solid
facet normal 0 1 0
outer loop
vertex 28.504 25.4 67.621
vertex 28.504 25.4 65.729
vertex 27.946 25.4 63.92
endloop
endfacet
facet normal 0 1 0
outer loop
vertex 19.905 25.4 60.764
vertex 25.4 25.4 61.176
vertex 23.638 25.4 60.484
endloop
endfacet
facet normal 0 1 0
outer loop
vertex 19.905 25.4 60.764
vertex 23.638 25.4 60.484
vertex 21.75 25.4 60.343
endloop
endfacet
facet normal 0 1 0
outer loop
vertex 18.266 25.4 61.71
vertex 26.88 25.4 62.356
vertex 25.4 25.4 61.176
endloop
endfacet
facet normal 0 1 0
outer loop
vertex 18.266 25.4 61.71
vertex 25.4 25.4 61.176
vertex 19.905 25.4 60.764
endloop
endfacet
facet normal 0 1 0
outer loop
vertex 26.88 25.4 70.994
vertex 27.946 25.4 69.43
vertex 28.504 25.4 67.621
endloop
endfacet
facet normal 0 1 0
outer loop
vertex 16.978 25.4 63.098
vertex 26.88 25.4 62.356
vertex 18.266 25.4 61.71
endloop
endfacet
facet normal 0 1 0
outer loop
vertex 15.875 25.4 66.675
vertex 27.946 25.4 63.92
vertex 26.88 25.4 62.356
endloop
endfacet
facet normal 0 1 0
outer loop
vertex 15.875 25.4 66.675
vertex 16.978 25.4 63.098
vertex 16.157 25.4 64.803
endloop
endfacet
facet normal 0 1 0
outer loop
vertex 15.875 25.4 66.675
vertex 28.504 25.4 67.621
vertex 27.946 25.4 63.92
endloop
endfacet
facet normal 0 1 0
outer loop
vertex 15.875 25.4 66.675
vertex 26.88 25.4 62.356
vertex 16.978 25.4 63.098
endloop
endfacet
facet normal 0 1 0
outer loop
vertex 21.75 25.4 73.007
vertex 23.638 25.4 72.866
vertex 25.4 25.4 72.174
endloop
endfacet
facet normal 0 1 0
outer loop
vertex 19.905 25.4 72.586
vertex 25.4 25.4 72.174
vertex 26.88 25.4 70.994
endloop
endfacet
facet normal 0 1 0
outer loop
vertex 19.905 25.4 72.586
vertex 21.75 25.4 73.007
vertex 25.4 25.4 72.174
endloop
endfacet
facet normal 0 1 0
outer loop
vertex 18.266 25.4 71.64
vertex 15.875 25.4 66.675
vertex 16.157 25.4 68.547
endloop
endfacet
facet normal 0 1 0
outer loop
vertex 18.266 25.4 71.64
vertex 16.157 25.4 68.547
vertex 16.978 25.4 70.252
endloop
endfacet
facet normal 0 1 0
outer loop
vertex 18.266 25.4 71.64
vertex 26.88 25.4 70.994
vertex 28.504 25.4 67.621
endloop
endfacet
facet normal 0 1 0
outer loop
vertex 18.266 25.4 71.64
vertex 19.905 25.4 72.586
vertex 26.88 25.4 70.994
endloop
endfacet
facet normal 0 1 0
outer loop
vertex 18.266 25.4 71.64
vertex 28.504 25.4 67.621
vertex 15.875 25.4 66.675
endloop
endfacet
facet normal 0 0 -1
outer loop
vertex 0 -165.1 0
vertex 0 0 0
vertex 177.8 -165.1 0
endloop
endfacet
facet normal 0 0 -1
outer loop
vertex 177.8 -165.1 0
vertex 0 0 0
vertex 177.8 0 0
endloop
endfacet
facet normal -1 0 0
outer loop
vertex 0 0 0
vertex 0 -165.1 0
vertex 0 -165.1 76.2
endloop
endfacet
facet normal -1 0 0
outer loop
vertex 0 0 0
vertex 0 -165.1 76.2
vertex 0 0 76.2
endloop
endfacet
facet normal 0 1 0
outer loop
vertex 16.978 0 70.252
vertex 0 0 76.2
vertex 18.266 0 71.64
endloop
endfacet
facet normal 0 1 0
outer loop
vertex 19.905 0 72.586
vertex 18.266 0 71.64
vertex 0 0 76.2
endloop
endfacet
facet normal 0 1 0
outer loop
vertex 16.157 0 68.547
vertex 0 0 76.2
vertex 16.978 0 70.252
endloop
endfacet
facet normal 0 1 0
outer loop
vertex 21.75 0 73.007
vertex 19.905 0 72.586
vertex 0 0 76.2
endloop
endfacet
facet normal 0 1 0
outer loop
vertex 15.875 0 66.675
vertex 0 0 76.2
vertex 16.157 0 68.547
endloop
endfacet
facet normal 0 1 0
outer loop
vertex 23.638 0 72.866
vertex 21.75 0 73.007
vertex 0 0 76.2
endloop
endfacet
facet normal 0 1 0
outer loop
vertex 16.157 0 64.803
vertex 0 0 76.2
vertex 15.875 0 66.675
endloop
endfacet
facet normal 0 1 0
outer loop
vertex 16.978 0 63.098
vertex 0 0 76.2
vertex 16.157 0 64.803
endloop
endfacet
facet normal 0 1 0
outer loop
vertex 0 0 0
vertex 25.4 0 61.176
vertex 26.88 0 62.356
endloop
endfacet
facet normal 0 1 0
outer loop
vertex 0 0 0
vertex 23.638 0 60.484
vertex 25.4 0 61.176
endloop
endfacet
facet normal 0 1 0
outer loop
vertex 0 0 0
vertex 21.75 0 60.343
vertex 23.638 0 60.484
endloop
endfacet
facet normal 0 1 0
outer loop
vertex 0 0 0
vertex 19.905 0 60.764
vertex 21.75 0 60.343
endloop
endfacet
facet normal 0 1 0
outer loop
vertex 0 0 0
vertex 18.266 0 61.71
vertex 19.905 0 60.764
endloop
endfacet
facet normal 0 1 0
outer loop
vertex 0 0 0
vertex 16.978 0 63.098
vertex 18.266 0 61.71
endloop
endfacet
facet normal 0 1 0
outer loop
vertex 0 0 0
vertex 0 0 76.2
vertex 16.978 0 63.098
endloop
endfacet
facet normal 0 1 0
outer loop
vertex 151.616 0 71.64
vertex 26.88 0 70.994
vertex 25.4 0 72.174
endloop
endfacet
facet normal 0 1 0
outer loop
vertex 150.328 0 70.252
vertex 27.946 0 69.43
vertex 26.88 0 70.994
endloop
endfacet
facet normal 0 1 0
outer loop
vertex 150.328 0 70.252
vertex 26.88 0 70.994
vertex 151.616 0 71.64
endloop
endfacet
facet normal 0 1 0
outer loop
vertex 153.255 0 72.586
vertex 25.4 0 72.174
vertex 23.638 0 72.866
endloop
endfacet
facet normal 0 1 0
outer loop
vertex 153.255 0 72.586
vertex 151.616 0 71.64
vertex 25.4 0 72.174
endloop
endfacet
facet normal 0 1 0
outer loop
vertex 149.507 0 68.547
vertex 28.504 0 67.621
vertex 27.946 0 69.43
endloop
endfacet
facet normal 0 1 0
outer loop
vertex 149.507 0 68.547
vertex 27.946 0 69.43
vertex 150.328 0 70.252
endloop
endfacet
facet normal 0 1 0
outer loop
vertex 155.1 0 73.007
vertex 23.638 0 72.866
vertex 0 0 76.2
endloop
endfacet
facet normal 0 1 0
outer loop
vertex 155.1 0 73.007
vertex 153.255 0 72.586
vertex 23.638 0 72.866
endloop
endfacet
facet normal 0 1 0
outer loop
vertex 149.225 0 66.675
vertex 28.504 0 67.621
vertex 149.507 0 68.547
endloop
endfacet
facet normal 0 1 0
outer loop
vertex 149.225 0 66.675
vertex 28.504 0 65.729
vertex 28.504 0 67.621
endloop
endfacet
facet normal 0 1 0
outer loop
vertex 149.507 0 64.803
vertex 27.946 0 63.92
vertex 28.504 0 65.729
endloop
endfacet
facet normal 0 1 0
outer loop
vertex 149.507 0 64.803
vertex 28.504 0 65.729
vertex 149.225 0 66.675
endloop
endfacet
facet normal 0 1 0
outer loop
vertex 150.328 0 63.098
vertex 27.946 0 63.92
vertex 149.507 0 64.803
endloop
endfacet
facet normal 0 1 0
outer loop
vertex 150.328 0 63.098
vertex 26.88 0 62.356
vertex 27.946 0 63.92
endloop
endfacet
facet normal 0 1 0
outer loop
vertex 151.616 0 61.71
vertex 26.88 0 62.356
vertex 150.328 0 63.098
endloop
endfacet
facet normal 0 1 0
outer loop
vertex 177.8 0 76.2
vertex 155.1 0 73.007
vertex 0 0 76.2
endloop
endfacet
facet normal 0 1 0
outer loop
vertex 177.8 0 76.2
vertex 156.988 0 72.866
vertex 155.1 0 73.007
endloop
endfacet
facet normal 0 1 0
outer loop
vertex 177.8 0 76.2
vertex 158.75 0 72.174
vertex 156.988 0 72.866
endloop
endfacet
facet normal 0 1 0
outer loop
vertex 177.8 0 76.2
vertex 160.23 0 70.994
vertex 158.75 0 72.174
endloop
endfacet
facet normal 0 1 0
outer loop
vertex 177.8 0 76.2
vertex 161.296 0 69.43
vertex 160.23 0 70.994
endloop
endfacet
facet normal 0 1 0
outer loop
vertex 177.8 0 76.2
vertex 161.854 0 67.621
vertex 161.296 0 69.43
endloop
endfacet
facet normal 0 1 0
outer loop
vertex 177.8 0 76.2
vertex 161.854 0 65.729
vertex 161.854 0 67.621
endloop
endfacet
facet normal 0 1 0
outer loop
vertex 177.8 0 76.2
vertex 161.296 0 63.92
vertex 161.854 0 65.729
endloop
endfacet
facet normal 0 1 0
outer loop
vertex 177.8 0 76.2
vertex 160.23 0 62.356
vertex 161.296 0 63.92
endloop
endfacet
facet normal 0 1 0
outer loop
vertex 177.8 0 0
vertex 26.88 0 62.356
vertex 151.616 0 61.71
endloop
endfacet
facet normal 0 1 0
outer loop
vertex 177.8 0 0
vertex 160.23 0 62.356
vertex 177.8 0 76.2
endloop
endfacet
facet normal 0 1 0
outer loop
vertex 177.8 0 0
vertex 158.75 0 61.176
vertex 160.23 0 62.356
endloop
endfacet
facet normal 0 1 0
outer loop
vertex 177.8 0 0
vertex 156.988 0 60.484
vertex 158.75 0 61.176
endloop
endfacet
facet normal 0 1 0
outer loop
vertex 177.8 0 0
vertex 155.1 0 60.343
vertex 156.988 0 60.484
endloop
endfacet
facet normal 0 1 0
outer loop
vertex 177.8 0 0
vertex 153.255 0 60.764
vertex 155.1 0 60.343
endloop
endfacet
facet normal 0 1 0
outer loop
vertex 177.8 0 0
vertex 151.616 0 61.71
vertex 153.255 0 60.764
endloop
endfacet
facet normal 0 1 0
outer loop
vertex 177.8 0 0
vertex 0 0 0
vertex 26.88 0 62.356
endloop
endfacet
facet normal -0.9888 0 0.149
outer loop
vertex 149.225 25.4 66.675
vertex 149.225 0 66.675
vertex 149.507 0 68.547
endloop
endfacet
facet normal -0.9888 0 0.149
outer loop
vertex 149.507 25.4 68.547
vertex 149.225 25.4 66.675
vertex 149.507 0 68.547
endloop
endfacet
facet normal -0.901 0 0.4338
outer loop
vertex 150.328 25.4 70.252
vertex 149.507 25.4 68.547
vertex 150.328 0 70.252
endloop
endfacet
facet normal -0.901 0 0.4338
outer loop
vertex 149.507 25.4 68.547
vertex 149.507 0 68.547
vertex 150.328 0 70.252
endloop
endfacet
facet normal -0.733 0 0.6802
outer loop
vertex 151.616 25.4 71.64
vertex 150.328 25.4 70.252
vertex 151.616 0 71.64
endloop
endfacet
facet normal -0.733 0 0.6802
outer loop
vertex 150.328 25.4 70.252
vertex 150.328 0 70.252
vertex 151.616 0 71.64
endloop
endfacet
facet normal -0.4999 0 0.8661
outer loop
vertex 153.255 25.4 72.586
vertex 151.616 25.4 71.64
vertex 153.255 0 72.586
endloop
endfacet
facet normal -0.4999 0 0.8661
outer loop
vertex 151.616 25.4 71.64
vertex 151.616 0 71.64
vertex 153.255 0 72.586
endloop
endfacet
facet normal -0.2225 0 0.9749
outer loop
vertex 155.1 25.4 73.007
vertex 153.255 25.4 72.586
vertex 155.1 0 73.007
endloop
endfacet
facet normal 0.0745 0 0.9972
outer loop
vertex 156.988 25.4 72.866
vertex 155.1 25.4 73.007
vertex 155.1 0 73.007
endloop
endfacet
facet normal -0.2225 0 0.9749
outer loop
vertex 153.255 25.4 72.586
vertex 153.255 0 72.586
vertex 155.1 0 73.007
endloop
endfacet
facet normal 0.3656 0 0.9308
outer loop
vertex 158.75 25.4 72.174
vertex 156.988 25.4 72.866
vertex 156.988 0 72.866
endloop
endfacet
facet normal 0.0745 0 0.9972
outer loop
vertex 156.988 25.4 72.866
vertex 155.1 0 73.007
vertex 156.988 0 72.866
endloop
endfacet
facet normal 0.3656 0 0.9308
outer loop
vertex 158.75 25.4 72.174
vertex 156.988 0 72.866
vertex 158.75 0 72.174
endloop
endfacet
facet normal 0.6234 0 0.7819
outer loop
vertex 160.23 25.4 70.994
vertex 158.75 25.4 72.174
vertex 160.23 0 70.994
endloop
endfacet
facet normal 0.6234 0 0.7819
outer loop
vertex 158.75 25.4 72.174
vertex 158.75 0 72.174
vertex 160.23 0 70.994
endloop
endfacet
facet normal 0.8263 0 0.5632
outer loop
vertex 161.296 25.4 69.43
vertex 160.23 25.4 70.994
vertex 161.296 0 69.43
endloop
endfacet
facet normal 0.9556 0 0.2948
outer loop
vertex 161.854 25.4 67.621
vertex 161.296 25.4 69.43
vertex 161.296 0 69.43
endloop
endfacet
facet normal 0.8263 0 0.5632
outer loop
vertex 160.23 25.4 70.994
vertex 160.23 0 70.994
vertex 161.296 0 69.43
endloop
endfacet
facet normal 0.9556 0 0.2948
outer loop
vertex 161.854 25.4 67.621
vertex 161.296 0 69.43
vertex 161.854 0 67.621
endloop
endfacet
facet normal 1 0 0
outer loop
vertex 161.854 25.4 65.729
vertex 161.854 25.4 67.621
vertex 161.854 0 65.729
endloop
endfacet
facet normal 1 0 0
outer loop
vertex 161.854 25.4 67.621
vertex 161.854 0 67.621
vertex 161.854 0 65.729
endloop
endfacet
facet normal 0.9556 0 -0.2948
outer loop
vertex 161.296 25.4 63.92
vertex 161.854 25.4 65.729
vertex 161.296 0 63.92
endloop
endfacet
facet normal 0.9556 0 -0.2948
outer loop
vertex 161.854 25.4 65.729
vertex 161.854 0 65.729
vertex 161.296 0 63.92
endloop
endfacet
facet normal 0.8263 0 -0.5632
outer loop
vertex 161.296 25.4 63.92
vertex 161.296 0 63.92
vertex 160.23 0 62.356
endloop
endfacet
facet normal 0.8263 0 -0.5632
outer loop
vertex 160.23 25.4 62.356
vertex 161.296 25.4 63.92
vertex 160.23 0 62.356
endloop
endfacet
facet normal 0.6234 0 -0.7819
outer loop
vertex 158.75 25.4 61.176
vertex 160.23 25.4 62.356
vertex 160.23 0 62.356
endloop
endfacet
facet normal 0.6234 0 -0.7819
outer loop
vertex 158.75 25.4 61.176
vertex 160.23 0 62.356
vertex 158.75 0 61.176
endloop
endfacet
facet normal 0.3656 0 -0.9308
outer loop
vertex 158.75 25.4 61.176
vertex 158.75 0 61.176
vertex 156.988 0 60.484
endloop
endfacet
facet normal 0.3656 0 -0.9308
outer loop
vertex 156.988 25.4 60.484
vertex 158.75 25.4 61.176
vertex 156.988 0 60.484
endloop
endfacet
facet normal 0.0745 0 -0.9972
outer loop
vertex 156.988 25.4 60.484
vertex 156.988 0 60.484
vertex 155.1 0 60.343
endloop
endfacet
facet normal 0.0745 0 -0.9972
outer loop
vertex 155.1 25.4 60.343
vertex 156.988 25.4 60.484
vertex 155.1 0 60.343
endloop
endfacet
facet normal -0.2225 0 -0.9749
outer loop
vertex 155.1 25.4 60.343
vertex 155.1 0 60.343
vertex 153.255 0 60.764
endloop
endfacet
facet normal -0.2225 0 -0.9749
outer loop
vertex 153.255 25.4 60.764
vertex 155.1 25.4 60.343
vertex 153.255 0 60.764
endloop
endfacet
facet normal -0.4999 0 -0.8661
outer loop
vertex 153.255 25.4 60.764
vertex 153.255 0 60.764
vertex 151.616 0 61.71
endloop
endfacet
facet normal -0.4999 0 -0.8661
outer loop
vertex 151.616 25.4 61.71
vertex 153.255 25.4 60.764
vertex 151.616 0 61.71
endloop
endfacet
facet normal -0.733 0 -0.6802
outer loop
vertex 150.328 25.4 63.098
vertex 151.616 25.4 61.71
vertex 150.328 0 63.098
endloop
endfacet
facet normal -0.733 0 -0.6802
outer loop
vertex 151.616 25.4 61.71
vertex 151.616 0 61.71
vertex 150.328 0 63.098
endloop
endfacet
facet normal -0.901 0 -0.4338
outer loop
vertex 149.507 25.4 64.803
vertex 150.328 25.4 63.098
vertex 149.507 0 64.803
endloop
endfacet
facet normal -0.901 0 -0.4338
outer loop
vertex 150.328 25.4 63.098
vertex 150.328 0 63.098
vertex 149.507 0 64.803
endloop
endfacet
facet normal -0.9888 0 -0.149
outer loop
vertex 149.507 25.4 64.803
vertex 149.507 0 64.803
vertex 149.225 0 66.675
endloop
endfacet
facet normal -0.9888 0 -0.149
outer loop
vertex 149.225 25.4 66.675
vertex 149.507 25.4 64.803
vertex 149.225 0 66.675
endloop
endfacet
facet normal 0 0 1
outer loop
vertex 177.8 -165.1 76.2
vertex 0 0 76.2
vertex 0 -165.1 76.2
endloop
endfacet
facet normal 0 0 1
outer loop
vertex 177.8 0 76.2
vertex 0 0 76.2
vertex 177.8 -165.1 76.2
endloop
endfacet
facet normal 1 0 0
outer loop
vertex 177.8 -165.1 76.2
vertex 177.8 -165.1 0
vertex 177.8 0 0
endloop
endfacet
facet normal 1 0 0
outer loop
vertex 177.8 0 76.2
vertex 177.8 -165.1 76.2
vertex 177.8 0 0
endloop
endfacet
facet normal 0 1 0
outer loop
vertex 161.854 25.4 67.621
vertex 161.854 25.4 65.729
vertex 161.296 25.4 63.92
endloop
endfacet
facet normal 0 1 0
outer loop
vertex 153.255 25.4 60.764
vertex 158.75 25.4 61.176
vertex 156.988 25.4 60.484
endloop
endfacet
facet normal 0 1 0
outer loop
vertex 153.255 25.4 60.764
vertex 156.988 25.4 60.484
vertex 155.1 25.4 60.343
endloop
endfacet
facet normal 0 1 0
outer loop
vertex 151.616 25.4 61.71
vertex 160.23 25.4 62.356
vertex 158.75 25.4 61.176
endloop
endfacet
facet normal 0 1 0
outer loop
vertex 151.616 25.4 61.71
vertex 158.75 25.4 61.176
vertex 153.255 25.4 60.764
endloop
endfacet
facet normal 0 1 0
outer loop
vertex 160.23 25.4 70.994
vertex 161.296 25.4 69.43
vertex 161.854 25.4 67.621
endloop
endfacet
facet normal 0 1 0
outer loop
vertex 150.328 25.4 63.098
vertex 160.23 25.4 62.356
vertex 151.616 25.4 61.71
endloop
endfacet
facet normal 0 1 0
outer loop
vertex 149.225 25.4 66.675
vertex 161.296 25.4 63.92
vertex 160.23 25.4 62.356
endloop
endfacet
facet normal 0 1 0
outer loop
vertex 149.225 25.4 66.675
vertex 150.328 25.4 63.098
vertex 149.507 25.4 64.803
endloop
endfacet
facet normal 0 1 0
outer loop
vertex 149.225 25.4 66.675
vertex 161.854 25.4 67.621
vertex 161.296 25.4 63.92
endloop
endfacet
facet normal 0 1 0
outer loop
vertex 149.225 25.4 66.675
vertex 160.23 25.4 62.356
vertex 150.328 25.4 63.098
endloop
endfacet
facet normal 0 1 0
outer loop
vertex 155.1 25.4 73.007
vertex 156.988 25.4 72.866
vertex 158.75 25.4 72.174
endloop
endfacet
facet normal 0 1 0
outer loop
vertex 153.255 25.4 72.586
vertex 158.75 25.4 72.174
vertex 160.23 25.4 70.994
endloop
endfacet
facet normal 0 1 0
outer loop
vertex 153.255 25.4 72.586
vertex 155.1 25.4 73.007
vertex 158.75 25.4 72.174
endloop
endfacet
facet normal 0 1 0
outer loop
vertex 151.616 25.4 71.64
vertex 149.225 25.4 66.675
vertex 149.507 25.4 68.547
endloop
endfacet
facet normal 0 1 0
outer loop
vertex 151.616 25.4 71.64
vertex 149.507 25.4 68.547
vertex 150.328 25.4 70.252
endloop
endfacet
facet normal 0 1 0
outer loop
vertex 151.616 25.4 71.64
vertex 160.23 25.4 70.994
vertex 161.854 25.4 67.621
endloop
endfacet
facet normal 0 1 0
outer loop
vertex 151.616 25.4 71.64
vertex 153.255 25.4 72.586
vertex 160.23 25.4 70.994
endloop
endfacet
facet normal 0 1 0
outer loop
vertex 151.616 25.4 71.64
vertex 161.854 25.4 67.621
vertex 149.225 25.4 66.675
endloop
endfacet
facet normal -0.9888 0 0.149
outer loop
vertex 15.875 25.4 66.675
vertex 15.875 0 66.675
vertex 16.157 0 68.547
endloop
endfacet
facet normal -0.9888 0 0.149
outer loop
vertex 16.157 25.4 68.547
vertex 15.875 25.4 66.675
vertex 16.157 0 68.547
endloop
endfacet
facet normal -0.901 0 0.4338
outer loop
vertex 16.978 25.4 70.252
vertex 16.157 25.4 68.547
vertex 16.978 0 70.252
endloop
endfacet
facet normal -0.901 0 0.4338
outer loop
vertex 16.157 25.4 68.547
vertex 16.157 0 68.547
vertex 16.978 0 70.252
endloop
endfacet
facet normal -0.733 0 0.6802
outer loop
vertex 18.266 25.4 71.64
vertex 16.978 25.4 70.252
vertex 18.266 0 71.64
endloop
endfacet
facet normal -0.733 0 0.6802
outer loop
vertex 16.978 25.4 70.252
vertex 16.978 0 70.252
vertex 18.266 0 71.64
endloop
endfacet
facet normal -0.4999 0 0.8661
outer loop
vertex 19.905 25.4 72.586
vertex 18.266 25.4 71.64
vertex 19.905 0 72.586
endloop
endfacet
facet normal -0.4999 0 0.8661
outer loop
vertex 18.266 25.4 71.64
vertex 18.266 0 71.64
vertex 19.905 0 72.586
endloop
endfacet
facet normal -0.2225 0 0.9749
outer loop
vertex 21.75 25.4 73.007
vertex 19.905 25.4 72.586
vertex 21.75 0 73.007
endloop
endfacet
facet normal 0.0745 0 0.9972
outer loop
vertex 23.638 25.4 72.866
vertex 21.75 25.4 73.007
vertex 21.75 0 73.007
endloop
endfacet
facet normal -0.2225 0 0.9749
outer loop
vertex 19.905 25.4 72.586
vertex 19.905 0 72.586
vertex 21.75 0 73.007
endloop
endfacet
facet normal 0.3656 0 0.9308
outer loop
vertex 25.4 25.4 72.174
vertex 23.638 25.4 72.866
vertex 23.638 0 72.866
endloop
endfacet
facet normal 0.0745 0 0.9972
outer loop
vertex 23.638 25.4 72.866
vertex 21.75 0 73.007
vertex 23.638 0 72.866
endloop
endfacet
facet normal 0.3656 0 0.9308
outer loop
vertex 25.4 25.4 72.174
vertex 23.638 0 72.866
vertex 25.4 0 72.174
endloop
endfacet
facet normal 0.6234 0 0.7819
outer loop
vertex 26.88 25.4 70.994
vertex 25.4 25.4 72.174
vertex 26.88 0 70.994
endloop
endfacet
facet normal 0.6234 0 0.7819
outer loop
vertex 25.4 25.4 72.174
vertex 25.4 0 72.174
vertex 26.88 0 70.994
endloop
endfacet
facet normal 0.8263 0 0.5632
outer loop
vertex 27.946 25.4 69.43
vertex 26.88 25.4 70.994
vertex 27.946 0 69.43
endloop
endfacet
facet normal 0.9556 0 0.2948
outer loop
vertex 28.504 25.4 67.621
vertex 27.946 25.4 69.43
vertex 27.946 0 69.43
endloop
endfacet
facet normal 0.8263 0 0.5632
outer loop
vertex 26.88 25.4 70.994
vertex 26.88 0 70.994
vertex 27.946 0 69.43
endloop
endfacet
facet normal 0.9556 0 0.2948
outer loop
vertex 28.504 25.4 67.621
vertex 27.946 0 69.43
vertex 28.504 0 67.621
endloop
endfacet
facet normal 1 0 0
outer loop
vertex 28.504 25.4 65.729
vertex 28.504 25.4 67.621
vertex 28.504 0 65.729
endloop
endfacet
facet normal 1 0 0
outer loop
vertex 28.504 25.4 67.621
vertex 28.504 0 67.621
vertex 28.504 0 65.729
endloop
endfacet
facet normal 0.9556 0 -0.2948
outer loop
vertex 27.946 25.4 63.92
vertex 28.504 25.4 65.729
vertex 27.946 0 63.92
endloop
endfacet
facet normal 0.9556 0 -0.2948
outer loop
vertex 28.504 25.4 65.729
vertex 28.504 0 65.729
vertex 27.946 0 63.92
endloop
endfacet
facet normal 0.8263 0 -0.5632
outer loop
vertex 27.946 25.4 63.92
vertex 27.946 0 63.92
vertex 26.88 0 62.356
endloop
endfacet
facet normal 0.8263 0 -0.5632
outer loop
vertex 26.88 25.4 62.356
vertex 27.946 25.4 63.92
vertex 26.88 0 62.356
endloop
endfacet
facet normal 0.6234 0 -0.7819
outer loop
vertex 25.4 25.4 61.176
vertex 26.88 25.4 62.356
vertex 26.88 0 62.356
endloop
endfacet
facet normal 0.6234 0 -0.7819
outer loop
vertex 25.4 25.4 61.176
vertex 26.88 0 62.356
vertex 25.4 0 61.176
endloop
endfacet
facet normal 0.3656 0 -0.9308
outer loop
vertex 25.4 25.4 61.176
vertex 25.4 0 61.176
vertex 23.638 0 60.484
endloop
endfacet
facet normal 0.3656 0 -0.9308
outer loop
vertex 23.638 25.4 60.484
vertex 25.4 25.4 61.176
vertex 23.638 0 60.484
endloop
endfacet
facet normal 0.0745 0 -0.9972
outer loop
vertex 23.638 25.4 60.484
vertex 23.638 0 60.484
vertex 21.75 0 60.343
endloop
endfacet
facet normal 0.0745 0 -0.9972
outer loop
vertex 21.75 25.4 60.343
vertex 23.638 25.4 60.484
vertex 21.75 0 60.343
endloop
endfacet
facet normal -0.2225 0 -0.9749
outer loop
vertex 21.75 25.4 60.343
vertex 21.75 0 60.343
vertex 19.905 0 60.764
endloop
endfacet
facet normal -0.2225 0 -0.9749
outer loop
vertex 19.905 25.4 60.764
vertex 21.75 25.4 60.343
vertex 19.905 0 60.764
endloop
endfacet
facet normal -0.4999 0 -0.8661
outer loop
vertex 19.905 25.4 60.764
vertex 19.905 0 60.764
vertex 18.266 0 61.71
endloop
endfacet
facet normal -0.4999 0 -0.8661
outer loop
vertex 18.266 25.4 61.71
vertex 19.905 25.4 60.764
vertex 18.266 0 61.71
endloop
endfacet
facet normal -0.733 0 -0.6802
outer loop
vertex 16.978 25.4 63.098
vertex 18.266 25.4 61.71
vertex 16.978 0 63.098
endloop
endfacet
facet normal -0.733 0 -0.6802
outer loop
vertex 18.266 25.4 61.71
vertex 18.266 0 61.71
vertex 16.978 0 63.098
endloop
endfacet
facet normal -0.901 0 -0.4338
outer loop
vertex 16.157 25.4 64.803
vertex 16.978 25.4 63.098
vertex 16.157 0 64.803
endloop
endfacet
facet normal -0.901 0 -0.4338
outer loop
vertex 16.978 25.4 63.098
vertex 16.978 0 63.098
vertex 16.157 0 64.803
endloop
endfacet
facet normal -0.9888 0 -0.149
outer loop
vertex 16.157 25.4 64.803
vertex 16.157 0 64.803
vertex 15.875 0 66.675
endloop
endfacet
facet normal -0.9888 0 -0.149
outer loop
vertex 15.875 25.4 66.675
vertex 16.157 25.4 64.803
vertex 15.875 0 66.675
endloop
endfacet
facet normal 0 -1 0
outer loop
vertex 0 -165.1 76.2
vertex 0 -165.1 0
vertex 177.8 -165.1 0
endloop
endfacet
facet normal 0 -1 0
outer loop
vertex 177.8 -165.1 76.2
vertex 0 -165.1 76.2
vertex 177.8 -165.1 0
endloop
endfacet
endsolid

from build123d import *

# Parameters (mm, degrees)
F0_W     = 177.8
F0_H     = 165.1
F1_DEPTH = 76.2
F2_R     = 6.35
F3_DEPTH = 25.4


with BuildPart() as f1:
    # F0 (on Top) → F1 (new body)
    with BuildSketch(Plane.XY):
        with Locations((88.9, -82.55)):
            Rectangle(F0_W, F0_H)
    extrude(amount=F1_DEPTH)

    # F2 (on face) → F3 (join)
    with BuildSketch(Plane(origin=(0, 0, 0), x_dir=(-1, 0, 0), z_dir=(0, 1, 0))):
        with Locations((-155.575, 66.675)):
            Circle(F2_R)
        with Locations((-22.225, 66.675)):
            Circle(F2_R)
    extrude(amount=F3_DEPTH)


solid = f1.part
